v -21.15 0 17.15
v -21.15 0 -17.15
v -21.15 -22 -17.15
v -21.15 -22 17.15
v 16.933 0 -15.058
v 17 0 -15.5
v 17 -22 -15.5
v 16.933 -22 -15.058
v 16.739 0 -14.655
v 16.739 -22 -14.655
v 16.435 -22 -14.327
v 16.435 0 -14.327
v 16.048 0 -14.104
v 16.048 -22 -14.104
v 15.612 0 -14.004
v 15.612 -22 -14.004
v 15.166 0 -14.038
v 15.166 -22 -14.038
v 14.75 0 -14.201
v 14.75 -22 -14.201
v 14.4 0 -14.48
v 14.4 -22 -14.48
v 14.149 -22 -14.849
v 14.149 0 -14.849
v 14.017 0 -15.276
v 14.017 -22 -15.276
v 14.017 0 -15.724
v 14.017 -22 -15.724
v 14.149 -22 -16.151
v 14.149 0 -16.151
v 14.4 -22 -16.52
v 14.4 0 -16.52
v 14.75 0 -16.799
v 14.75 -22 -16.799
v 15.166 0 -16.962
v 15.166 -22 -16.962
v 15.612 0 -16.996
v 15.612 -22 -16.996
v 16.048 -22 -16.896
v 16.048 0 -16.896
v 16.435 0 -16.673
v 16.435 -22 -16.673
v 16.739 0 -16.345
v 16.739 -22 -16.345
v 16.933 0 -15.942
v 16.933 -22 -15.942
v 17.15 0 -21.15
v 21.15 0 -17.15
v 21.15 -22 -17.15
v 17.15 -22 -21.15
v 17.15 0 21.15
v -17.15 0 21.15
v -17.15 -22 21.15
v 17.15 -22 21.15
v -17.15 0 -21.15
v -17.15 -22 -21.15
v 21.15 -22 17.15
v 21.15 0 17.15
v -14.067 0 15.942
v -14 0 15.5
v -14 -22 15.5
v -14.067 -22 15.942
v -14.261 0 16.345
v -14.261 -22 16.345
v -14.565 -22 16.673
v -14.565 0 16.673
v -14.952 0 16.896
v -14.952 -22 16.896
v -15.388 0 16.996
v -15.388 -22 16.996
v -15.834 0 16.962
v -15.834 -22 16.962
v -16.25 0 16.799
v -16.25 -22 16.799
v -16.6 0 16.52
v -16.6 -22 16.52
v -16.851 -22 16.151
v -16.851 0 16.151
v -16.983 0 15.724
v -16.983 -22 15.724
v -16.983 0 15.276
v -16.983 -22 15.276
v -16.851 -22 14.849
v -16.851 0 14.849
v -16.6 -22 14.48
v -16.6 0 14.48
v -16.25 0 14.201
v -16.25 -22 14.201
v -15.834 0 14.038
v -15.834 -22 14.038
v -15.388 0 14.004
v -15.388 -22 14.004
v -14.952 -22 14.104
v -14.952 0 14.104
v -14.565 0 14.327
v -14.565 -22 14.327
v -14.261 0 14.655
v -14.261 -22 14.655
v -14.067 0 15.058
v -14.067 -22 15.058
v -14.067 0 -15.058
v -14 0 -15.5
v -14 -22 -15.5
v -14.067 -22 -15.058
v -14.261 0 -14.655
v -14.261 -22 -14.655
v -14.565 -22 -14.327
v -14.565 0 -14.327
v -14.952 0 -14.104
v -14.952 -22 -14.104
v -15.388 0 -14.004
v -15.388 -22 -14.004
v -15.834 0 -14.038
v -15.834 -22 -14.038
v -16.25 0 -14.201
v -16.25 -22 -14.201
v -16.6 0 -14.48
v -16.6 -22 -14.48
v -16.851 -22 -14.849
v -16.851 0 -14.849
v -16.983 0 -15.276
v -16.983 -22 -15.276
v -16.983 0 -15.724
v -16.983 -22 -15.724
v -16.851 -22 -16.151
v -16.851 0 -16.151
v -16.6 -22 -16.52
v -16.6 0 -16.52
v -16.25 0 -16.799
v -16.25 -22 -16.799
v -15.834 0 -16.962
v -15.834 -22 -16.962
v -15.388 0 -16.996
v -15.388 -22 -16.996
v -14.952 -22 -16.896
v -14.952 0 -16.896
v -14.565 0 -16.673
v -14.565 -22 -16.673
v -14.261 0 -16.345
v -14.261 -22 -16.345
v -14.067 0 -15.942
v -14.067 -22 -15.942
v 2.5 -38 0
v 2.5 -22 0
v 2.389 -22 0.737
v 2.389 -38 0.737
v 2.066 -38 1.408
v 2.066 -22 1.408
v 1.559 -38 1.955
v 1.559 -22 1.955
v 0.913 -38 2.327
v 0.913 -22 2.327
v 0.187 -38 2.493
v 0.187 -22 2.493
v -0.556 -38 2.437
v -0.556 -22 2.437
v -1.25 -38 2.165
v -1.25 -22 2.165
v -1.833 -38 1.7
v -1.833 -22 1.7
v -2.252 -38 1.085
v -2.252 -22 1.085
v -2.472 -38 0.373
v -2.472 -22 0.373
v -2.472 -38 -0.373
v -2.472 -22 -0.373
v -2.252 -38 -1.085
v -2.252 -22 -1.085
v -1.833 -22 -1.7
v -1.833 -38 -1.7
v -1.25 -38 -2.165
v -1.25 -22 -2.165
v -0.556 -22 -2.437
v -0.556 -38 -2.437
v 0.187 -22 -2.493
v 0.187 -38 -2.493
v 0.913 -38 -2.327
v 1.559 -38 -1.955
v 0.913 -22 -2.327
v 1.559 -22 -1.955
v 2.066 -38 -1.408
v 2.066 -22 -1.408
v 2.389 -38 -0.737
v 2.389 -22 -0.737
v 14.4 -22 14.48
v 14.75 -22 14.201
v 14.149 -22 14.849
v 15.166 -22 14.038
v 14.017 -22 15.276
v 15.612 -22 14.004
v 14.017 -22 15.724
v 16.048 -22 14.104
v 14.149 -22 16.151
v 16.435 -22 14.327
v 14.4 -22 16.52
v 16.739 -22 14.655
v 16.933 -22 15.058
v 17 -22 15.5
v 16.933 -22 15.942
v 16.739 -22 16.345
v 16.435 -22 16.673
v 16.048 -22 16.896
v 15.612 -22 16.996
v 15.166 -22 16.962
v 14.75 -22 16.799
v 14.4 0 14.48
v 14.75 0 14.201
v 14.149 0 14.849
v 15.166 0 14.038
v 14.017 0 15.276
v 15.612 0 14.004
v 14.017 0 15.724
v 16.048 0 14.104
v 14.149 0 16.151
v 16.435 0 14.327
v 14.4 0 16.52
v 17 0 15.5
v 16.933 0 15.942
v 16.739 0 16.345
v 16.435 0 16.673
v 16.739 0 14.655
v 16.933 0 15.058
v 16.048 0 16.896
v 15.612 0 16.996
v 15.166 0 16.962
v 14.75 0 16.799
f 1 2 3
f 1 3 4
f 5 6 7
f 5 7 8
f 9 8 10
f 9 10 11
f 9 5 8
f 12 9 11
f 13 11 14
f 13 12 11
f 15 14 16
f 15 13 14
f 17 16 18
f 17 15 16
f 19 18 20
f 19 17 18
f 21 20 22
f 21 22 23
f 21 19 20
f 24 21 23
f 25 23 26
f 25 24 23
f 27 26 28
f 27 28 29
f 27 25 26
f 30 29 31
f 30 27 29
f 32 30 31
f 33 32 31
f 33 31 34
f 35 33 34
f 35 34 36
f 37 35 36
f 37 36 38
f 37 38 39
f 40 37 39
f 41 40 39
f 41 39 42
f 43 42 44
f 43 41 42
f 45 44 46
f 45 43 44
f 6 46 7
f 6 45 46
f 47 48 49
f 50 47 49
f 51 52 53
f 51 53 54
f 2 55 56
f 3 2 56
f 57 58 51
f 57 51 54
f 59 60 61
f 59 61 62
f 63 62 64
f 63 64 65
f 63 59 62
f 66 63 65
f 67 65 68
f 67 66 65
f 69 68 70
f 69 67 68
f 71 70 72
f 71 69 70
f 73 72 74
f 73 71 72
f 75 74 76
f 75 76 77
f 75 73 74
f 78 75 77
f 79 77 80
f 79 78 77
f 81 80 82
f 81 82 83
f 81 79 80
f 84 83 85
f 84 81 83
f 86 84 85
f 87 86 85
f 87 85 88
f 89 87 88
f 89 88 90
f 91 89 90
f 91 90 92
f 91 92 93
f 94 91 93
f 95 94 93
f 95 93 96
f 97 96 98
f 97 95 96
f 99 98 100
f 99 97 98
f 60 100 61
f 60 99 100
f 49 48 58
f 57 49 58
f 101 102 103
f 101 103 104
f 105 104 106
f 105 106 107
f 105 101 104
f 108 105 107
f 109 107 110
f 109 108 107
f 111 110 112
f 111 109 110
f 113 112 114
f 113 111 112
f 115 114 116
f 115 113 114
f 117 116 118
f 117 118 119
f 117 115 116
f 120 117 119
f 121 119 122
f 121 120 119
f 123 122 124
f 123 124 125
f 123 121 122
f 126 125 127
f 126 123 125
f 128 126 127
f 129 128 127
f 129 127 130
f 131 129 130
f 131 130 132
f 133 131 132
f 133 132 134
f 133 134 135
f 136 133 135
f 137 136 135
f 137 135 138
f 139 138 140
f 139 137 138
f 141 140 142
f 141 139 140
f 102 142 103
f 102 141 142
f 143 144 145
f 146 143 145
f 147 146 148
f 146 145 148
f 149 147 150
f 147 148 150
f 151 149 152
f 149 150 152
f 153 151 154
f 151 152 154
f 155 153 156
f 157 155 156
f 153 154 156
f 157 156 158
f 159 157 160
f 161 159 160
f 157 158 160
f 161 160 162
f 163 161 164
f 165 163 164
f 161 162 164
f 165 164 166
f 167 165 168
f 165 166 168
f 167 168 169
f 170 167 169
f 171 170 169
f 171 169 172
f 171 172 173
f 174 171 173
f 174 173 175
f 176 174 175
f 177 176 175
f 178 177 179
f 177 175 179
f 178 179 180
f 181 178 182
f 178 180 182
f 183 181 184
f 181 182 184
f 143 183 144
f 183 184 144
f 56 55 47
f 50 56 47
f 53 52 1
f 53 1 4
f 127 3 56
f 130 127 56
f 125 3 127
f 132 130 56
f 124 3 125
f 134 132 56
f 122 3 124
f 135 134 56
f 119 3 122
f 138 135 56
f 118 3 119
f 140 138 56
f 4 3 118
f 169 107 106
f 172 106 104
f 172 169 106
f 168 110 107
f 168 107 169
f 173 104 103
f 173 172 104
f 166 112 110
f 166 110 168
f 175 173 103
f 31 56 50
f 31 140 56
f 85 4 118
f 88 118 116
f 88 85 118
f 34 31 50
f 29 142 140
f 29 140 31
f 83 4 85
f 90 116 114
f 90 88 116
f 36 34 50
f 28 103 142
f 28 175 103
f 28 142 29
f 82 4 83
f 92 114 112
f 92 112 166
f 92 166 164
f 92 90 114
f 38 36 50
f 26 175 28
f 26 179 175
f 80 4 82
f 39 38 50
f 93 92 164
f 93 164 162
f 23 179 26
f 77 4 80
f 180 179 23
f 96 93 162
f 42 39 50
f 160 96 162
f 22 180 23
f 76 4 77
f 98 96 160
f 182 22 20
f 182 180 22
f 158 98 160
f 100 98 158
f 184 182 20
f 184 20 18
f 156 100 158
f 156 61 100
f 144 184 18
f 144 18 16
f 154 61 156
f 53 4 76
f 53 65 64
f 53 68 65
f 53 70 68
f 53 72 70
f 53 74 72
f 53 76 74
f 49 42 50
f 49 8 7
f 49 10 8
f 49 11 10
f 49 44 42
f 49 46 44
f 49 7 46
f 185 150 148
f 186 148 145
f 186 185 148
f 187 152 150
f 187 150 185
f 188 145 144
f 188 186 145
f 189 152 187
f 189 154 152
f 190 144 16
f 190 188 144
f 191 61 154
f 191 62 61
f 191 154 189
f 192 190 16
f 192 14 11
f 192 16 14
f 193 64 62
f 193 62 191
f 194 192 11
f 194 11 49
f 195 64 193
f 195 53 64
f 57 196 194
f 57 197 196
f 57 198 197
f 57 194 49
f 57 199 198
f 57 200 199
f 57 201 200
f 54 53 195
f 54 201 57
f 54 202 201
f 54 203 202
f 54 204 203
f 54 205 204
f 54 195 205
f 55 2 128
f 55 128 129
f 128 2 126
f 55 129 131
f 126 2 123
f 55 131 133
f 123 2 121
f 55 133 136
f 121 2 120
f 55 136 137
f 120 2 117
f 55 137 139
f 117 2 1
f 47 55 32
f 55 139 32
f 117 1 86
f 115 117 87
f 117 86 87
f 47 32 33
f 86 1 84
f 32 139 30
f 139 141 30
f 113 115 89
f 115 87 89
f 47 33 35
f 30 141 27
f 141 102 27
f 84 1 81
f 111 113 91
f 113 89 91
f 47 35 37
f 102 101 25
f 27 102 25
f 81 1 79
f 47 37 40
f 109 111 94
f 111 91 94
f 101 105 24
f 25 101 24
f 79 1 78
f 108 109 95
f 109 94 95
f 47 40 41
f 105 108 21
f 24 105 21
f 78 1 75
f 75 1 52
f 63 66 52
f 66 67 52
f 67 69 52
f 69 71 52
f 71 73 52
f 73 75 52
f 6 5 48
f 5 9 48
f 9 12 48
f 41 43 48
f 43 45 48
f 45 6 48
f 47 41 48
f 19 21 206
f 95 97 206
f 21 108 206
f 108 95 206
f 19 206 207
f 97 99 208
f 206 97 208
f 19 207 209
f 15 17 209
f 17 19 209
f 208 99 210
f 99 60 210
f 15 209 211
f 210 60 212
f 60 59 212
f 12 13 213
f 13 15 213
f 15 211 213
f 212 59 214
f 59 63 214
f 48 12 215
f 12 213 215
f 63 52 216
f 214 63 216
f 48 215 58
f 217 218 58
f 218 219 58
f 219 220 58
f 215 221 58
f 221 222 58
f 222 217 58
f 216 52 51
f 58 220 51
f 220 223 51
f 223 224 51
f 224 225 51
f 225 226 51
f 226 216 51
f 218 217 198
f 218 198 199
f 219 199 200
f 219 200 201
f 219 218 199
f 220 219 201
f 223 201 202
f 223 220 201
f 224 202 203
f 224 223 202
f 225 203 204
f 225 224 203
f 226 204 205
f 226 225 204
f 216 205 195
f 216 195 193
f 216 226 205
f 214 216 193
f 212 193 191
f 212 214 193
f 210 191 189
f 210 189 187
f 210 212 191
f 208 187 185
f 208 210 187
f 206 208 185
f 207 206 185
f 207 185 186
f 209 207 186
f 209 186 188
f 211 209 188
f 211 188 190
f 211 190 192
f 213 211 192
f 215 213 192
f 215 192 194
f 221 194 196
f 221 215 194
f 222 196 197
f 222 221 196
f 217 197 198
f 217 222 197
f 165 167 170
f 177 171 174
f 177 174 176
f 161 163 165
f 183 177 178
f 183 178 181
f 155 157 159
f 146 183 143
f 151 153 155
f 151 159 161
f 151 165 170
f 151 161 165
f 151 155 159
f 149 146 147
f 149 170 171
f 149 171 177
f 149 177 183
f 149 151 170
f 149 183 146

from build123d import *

# Parameters (mm, degrees)
F0_W     = 42.3
F0_H     = 42.3
F0_R     = 1.5
F1_DEPTH = 22
F2_R     = 2.5
F3_DEPTH = 16
F4_SIZE  = 4


with BuildPart() as f1:
    # F0 (on Front) → F1 (new body)
    with BuildSketch(Plane.XZ):
        Rectangle(F0_W, F0_H)
        with Locations((-15.5, -15.5)):
            Circle(F0_R, mode=Mode.SUBTRACT)
        with Locations((15.5, -15.5)):
            Circle(F0_R, mode=Mode.SUBTRACT)
        with Locations((-15.5, 15.5)):
            Circle(F0_R, mode=Mode.SUBTRACT)
        with Locations((15.5, 15.5)):
            Circle(F0_R, mode=Mode.SUBTRACT)
    extrude(amount=F1_DEPTH)

    # F2 (on face) → F3 (join)
    with BuildSketch(Plane.XZ.offset(22)):
        Circle(F2_R)
    extrude(amount=F3_DEPTH)

    # F4
    f4_edges = [f1.edges().sort_by_distance(p)[0] for p in [
        (21.15, -11, 21.15),
        (21.15, -11, -21.15),
        (-21.15, -11, 21.15),
        (-21.15, -11, -21.15),
    ]]
    chamfer(f4_edges, length=F4_SIZE)


solid = f1.part
